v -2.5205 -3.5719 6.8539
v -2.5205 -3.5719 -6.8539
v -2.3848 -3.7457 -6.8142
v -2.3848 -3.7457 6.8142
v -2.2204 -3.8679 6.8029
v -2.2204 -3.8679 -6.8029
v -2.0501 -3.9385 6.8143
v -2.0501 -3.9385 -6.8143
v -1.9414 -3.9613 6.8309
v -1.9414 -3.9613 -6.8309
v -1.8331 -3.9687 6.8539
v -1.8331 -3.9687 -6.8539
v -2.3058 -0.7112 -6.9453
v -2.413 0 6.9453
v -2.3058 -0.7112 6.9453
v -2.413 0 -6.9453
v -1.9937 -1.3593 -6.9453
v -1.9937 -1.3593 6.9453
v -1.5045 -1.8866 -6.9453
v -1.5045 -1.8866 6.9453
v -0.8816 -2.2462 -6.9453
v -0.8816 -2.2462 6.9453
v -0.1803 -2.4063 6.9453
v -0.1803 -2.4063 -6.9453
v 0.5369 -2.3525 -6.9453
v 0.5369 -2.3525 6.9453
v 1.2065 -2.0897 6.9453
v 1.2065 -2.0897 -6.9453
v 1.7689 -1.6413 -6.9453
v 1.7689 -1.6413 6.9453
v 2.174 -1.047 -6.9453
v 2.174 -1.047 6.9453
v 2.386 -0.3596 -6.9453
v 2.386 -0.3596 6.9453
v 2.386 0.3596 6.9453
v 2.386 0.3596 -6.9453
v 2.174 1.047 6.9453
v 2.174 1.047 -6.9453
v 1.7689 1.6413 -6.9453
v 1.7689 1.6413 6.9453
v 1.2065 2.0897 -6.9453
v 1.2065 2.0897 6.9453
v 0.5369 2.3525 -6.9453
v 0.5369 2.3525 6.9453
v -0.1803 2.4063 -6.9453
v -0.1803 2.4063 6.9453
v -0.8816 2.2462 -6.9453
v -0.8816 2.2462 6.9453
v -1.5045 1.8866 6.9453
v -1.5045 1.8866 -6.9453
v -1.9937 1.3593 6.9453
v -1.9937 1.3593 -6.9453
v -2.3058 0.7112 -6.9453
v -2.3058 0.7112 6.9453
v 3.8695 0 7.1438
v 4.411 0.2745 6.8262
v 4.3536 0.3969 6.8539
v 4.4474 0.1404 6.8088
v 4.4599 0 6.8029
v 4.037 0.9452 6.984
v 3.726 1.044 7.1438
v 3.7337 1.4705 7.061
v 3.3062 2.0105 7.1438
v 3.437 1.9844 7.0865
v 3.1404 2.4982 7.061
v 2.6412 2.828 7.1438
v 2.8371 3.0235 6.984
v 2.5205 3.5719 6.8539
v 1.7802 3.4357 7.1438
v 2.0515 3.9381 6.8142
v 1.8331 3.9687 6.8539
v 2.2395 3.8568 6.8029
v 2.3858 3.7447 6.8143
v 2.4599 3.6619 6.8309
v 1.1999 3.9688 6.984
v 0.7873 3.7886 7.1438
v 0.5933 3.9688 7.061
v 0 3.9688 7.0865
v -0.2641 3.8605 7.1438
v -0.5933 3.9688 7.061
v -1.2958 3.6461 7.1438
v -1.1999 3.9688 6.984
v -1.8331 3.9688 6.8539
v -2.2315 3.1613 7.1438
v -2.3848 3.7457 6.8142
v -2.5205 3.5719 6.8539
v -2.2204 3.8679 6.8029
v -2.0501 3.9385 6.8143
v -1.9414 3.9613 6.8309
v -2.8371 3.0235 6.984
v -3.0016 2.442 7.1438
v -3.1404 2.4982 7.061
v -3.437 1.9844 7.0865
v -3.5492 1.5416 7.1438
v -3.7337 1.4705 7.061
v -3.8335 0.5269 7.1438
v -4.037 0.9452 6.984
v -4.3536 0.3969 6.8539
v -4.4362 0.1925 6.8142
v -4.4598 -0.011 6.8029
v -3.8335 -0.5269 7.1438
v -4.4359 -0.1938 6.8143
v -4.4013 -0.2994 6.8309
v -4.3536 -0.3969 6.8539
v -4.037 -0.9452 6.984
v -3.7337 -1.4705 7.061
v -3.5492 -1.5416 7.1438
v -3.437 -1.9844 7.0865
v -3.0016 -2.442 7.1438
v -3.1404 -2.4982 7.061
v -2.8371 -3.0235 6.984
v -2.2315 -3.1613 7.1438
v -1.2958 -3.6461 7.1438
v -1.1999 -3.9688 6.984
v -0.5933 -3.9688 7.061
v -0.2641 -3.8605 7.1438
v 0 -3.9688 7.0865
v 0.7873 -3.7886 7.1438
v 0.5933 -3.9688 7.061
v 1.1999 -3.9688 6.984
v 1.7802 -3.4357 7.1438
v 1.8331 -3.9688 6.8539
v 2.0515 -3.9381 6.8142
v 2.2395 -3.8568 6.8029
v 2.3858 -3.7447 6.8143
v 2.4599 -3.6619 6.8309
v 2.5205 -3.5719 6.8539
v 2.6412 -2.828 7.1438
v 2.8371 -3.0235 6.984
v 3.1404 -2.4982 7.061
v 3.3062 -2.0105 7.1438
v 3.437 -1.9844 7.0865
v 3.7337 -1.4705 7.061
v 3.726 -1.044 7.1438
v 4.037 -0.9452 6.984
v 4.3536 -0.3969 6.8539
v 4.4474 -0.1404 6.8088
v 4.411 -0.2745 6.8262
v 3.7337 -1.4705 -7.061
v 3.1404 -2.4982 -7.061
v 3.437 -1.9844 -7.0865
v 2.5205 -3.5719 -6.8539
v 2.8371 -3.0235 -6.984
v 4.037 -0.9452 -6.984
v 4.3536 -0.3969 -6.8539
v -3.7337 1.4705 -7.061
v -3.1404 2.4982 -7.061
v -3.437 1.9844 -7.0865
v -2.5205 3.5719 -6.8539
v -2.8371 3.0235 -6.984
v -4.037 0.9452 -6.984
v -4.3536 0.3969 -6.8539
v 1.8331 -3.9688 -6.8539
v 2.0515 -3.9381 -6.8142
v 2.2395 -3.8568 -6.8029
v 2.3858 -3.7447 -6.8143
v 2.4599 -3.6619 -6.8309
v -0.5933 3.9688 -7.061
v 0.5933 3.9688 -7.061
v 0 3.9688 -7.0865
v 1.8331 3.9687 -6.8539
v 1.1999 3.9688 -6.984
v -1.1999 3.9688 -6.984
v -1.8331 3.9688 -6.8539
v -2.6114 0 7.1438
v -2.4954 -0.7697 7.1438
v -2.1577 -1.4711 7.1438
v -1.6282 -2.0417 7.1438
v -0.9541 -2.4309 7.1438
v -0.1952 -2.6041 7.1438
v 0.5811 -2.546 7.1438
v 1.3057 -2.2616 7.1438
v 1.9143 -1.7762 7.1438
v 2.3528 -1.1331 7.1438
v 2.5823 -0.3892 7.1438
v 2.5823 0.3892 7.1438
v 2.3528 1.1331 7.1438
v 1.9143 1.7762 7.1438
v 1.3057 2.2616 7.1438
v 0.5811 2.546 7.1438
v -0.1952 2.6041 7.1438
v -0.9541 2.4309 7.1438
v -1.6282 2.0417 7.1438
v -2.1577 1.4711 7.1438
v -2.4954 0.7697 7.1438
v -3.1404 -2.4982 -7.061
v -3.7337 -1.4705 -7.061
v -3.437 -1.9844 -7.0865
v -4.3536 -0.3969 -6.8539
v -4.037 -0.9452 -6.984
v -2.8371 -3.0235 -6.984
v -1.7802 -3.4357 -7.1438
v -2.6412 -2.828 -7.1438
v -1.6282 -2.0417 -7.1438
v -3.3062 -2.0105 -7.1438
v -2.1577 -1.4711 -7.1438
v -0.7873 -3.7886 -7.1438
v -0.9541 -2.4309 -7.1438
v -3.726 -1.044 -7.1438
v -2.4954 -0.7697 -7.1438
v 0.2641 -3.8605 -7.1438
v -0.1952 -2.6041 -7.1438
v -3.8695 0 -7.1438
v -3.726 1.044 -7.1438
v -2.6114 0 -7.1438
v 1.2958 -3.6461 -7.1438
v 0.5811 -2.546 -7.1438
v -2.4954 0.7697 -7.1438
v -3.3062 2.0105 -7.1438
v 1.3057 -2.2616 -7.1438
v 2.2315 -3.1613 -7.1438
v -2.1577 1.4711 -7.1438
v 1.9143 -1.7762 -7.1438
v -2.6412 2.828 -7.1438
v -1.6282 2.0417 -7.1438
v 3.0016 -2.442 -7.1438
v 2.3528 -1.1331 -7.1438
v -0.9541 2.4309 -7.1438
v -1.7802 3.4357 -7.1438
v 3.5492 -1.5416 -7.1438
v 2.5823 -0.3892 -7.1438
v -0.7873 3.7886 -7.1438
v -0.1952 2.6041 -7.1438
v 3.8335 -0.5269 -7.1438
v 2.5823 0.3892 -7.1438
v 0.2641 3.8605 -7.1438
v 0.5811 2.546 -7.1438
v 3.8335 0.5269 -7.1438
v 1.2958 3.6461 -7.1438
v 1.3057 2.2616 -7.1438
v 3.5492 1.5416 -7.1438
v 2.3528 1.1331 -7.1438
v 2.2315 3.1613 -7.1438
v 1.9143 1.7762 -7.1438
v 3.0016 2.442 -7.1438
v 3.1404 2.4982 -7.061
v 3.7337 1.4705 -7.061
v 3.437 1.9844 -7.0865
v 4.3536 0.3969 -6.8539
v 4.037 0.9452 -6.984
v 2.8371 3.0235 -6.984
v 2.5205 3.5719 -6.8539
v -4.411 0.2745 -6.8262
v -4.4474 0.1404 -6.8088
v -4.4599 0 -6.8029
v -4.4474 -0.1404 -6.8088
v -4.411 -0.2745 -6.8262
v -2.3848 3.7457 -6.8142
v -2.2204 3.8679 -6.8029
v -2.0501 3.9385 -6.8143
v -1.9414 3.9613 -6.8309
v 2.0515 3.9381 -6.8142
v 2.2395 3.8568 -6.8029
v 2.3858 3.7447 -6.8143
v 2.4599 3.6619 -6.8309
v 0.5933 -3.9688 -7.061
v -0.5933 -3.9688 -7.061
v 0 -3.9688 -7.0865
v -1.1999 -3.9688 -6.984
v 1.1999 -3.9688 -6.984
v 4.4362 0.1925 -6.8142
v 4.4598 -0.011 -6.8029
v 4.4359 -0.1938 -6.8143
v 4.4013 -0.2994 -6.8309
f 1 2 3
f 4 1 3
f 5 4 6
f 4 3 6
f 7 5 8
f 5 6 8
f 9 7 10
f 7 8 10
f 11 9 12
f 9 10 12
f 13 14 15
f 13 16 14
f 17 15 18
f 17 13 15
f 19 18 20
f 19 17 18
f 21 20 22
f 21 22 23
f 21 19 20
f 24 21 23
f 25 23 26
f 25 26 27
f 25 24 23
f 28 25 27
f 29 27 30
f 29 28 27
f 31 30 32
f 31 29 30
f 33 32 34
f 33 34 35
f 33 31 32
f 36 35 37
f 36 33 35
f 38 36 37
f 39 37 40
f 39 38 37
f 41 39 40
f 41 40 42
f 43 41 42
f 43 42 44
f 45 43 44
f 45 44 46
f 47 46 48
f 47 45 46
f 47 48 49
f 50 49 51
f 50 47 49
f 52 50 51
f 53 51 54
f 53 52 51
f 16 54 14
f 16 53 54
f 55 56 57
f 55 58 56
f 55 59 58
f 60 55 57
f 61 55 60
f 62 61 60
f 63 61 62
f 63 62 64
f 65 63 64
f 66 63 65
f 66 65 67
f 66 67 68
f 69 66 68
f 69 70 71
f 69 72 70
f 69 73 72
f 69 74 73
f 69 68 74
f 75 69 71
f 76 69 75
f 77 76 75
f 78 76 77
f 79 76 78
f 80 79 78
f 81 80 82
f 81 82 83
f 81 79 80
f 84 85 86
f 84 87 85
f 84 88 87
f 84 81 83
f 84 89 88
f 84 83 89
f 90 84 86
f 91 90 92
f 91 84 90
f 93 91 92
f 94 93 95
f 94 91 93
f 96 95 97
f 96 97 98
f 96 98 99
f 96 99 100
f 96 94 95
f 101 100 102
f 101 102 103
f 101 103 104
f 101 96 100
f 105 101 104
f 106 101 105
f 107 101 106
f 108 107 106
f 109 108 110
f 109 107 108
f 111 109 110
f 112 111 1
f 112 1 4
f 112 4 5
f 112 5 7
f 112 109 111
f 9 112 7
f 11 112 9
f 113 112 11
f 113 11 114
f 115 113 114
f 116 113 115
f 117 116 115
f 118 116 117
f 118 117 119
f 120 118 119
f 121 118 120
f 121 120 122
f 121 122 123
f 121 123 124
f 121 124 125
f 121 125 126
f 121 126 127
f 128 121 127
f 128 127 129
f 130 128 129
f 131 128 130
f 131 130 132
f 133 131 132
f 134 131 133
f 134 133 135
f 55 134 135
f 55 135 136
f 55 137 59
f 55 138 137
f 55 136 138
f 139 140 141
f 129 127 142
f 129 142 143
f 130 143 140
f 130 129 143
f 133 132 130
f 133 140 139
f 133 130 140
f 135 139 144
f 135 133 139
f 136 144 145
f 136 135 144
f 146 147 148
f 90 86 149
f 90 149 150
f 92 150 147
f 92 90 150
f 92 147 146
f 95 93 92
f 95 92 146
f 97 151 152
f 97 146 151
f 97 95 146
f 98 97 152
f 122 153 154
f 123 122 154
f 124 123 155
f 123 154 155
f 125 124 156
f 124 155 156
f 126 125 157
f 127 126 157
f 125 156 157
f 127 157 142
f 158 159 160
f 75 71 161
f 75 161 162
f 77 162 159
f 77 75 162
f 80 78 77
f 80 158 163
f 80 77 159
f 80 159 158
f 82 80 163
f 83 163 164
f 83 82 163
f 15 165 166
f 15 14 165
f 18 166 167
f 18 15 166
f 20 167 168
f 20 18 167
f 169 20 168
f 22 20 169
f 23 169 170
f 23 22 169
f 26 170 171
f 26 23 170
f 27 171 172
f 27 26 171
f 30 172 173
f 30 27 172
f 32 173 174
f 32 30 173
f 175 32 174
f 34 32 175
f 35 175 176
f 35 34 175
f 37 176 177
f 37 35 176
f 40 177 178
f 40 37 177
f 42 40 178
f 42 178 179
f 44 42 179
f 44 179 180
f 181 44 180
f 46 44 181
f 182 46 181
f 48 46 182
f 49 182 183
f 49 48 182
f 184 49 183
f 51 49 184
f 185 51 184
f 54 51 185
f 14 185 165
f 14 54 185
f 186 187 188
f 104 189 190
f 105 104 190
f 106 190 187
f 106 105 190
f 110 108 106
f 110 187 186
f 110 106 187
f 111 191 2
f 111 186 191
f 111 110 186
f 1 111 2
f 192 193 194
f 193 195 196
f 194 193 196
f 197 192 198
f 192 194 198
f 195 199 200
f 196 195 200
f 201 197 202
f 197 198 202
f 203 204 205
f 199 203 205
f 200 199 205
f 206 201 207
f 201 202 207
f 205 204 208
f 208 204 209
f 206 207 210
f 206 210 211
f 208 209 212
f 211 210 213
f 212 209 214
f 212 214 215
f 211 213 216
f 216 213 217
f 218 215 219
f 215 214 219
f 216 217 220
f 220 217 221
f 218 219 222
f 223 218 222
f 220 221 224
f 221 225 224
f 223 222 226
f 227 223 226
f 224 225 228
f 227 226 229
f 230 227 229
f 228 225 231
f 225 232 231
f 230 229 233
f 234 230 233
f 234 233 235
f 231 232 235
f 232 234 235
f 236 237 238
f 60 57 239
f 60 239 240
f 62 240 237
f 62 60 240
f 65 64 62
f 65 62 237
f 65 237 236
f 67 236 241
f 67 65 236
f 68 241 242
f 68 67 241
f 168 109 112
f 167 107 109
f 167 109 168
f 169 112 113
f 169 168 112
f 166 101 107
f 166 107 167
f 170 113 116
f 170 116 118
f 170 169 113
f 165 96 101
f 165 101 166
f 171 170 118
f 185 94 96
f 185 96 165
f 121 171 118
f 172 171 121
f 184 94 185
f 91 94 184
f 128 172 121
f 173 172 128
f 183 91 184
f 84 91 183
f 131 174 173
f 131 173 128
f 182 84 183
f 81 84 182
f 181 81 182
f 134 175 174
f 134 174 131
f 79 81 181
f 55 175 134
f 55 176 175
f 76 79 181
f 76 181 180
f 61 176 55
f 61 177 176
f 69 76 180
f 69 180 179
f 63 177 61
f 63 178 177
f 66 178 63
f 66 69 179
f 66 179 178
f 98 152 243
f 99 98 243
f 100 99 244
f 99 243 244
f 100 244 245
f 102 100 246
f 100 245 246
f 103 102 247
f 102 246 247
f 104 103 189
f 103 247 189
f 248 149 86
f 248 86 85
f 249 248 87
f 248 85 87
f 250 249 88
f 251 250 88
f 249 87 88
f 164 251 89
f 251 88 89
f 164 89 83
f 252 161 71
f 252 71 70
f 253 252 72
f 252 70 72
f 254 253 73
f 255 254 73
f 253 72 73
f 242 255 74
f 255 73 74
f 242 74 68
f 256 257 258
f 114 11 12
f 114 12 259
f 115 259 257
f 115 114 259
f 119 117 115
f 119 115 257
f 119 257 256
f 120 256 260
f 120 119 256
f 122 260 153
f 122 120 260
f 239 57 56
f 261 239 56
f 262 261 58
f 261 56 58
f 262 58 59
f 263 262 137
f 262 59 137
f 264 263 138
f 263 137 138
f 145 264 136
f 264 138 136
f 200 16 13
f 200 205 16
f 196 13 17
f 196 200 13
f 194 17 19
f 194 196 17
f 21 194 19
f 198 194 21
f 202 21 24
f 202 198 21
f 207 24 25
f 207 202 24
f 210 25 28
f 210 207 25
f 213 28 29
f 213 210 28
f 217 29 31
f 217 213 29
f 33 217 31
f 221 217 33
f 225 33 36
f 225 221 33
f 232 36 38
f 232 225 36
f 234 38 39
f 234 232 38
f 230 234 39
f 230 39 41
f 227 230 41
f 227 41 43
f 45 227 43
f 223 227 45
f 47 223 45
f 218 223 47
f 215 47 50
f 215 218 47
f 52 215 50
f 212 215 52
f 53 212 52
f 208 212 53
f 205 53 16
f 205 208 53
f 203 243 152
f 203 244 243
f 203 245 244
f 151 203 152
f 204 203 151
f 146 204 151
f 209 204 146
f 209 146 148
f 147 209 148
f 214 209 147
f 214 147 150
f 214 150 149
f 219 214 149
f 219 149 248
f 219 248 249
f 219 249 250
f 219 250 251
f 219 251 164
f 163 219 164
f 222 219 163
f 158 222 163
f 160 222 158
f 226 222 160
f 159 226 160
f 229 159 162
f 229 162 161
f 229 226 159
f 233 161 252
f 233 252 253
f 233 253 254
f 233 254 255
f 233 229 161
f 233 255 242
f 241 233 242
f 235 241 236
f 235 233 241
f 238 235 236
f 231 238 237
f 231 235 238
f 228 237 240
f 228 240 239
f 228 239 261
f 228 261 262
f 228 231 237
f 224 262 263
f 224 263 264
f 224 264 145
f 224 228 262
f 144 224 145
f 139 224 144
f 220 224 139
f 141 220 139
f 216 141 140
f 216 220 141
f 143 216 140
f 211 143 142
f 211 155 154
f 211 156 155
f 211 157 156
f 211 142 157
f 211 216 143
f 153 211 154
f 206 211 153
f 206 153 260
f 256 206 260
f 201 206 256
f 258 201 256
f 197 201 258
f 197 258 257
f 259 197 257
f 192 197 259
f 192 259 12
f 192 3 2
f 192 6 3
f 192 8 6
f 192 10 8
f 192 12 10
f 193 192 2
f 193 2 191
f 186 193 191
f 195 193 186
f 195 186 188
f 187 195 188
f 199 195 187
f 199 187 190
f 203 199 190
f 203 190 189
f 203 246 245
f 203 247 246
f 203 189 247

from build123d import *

# Parameters (mm, degrees)
SKETCH4_R           = 3.190875
BOSS_EXTRUDE1_DEPTH = 7.14375
SKETCH5_OUTSIDE_W   = 72.142
SKETCH5_OUTSIDE_H   = 70.914
SKETCH5_OUTSIDE_R   = 3.86953125
CUT_EXTRUDE1_DEPTH  = 16.520468256
CUT_EXTRUDE1_DRAFT  = -60
SKETCH6_OUTSIDE_W   = 72.142
SKETCH6_OUTSIDE_H   = 70.914
SKETCH6_OUTSIDE_R   = 3.86953125
CUT_EXTRUDE2_DEPTH  = 16.520468256
CUT_EXTRUDE2_DRAFT  = -60
FILLET1_R           = 0.79375


with BuildPart() as part:
    # Sketch3 → Revolve1 (revolve)
    with BuildSketch(Plane(origin=(0, 0, 0), x_dir=(0, 0, -1), z_dir=(1, 0, 0)), mode=Mode.PRIVATE) as revolve1_sk:
        Polygon((7.14375, 2.6114375), (7.14375, 3.96875), (0, 3.96875), (-7.14375, 3.96875), (-7.14375, 2.6114375), (-6.9453125, 2.413), (6.9453125, 2.413), align=None)
        Polygon((7.14375, 2.6114375), (7.14375, 3.96875), (0, 3.96875), (-7.14375, 3.96875), (-7.14375, 2.6114375), (-6.9453125, 2.413), (6.9453125, 2.413), align=None)
    revolve(revolve1_sk.sketch.rotate(Axis((0, 0, -7.14375), (0, 0, 1)), 90), axis=Axis((0, 0, -7.14375), (0, 0, 1)))

    # Sketch4 → Boss-Extrude1 (add, symmetric)
    with BuildSketch(Plane.XY):
        Polygon((-2.291358881, 3.96875), (-4.582717762, 0), (-2.291358881, -3.96875), (2.291358881, -3.96875), (4.582717762, 0), (2.291358881, 3.96875), align=None)
        Circle(SKETCH4_R, mode=Mode.SUBTRACT)
    extrude(amount=BOSS_EXTRUDE1_DEPTH, both=True)


with BuildPart() as cut_extrude1_tool:
    # Sketch5 outside → Cut-Extrude1 (with draft: the straight prism first)
    with BuildSketch(Plane.XY.offset(7.14375)):
        Rectangle(SKETCH5_OUTSIDE_W, SKETCH5_OUTSIDE_H)
        Circle(SKETCH5_OUTSIDE_R, mode=Mode.SUBTRACT)
    extrude(amount=-CUT_EXTRUDE1_DEPTH)
    # Cut-Extrude1: the draft: its side faces are tilted about the plane it starts from
    cut_extrude1_sides = [cut_extrude1_tool.faces().sort_by_distance(p)[0] for p in [
        (0, -35.457, -1.116484128),
        (36.071, 0, -1.116484128),
        (0, 35.457, -1.116484128),
        (-36.071, 0, -1.116484128),
        (-3.86953125, 0, -1.116484128),
    ]]
    draft(cut_extrude1_sides, Plane.XY.offset(7.14375), CUT_EXTRUDE1_DRAFT)


with BuildPart() as part_1:
    add(part.part)

    # Cut-Extrude1: cut by cut_extrude1_tool
    add(cut_extrude1_tool.part, mode=Mode.SUBTRACT)


with BuildPart() as cut_extrude2_tool:
    # Sketch6 outside → Cut-Extrude2 (with draft: the straight prism first)
    with BuildSketch(Plane(origin=(0, 0, -7.14375), x_dir=(-1, 0, 0), z_dir=(0, 0, -1))):
        Rectangle(SKETCH6_OUTSIDE_W, SKETCH6_OUTSIDE_H)
        Circle(SKETCH6_OUTSIDE_R, mode=Mode.SUBTRACT)
    extrude(amount=-CUT_EXTRUDE2_DEPTH)
    # Cut-Extrude2: the draft: its side faces are tilted about the plane it starts from
    cut_extrude2_sides = [cut_extrude2_tool.faces().sort_by_distance(p)[0] for p in [
        (0, -35.457, 1.116484128),
        (-36.071, 0, 1.116484128),
        (0, 35.457, 1.116484128),
        (36.071, 0, 1.116484128),
        (3.86953125, 0, 1.116484128),
    ]]
    draft(cut_extrude2_sides, Plane(origin=(0, 0, -7.14375), x_dir=(-1, 0, 0), z_dir=(0, 0, -1)), CUT_EXTRUDE2_DRAFT)


with BuildPart() as part_2:
    add(part_1.part)

    # Cut-Extrude2: cut by cut_extrude2_tool
    add(cut_extrude2_tool.part, mode=Mode.SUBTRACT)

    # Fillet1
    # the kernel refuses this fillet: 0.79375 mm, written as the material it takes off along each edge
    with BuildSketch(Plane(origin=(2.291358881, 3.96875, 7.877671016), x_dir=(0.49999999999999933, -0.866025403784439, 0), z_dir=(0, 0, -1)), Plane(origin=(-4.582717762, 0, -7.877671016), x_dir=(0.5000000000000004, -0.8660254037844384, 0), z_dir=(0, 0, 1)), Plane(origin=(4.582717762, 0, 7.877671016), x_dir=(-0.49999999999999917, -0.8660254037844392, 0), z_dir=(0, 0, -1)), Plane(origin=(-2.291358881, 3.96875, 7.877671016), x_dir=(1, 0, 0), z_dir=(0, 0, -1))) as fillet1_piece_1:
        with BuildLine():
            CenterArc((FILLET1_R * 0.57735026919, FILLET1_R), FILLET1_R, 210, 60)
            Line((-FILLET1_R * 0.288675134595, FILLET1_R * 0.5), (0, 0))
            Line((0, 0), (FILLET1_R * 0.57735026919, 0))
        make_face()
    extrude(amount=15.755342032, mode=Mode.SUBTRACT)
    with BuildSketch(Plane(origin=(-2.291358881, -3.96875, -7.877671016), x_dir=(-0.5000000000000001, 0.8660254037844386, 0), z_dir=(0, 0, 1)), Plane(origin=(2.291358881, -3.96875, -7.877671016), x_dir=(-1, 0, 0), z_dir=(0, 0, 1))) as fillet1_piece_2:
        with BuildLine():
            CenterArc((FILLET1_R * 0.57735026919, -FILLET1_R), FILLET1_R, 90, 60)
            Line((-FILLET1_R * 0.288675134595, -FILLET1_R * 0.5), (0, 0))
            Line((0, 0), (FILLET1_R * 0.57735026919, 0))
        make_face()
    extrude(amount=15.755342032, mode=Mode.SUBTRACT)


solid = part_2.part
